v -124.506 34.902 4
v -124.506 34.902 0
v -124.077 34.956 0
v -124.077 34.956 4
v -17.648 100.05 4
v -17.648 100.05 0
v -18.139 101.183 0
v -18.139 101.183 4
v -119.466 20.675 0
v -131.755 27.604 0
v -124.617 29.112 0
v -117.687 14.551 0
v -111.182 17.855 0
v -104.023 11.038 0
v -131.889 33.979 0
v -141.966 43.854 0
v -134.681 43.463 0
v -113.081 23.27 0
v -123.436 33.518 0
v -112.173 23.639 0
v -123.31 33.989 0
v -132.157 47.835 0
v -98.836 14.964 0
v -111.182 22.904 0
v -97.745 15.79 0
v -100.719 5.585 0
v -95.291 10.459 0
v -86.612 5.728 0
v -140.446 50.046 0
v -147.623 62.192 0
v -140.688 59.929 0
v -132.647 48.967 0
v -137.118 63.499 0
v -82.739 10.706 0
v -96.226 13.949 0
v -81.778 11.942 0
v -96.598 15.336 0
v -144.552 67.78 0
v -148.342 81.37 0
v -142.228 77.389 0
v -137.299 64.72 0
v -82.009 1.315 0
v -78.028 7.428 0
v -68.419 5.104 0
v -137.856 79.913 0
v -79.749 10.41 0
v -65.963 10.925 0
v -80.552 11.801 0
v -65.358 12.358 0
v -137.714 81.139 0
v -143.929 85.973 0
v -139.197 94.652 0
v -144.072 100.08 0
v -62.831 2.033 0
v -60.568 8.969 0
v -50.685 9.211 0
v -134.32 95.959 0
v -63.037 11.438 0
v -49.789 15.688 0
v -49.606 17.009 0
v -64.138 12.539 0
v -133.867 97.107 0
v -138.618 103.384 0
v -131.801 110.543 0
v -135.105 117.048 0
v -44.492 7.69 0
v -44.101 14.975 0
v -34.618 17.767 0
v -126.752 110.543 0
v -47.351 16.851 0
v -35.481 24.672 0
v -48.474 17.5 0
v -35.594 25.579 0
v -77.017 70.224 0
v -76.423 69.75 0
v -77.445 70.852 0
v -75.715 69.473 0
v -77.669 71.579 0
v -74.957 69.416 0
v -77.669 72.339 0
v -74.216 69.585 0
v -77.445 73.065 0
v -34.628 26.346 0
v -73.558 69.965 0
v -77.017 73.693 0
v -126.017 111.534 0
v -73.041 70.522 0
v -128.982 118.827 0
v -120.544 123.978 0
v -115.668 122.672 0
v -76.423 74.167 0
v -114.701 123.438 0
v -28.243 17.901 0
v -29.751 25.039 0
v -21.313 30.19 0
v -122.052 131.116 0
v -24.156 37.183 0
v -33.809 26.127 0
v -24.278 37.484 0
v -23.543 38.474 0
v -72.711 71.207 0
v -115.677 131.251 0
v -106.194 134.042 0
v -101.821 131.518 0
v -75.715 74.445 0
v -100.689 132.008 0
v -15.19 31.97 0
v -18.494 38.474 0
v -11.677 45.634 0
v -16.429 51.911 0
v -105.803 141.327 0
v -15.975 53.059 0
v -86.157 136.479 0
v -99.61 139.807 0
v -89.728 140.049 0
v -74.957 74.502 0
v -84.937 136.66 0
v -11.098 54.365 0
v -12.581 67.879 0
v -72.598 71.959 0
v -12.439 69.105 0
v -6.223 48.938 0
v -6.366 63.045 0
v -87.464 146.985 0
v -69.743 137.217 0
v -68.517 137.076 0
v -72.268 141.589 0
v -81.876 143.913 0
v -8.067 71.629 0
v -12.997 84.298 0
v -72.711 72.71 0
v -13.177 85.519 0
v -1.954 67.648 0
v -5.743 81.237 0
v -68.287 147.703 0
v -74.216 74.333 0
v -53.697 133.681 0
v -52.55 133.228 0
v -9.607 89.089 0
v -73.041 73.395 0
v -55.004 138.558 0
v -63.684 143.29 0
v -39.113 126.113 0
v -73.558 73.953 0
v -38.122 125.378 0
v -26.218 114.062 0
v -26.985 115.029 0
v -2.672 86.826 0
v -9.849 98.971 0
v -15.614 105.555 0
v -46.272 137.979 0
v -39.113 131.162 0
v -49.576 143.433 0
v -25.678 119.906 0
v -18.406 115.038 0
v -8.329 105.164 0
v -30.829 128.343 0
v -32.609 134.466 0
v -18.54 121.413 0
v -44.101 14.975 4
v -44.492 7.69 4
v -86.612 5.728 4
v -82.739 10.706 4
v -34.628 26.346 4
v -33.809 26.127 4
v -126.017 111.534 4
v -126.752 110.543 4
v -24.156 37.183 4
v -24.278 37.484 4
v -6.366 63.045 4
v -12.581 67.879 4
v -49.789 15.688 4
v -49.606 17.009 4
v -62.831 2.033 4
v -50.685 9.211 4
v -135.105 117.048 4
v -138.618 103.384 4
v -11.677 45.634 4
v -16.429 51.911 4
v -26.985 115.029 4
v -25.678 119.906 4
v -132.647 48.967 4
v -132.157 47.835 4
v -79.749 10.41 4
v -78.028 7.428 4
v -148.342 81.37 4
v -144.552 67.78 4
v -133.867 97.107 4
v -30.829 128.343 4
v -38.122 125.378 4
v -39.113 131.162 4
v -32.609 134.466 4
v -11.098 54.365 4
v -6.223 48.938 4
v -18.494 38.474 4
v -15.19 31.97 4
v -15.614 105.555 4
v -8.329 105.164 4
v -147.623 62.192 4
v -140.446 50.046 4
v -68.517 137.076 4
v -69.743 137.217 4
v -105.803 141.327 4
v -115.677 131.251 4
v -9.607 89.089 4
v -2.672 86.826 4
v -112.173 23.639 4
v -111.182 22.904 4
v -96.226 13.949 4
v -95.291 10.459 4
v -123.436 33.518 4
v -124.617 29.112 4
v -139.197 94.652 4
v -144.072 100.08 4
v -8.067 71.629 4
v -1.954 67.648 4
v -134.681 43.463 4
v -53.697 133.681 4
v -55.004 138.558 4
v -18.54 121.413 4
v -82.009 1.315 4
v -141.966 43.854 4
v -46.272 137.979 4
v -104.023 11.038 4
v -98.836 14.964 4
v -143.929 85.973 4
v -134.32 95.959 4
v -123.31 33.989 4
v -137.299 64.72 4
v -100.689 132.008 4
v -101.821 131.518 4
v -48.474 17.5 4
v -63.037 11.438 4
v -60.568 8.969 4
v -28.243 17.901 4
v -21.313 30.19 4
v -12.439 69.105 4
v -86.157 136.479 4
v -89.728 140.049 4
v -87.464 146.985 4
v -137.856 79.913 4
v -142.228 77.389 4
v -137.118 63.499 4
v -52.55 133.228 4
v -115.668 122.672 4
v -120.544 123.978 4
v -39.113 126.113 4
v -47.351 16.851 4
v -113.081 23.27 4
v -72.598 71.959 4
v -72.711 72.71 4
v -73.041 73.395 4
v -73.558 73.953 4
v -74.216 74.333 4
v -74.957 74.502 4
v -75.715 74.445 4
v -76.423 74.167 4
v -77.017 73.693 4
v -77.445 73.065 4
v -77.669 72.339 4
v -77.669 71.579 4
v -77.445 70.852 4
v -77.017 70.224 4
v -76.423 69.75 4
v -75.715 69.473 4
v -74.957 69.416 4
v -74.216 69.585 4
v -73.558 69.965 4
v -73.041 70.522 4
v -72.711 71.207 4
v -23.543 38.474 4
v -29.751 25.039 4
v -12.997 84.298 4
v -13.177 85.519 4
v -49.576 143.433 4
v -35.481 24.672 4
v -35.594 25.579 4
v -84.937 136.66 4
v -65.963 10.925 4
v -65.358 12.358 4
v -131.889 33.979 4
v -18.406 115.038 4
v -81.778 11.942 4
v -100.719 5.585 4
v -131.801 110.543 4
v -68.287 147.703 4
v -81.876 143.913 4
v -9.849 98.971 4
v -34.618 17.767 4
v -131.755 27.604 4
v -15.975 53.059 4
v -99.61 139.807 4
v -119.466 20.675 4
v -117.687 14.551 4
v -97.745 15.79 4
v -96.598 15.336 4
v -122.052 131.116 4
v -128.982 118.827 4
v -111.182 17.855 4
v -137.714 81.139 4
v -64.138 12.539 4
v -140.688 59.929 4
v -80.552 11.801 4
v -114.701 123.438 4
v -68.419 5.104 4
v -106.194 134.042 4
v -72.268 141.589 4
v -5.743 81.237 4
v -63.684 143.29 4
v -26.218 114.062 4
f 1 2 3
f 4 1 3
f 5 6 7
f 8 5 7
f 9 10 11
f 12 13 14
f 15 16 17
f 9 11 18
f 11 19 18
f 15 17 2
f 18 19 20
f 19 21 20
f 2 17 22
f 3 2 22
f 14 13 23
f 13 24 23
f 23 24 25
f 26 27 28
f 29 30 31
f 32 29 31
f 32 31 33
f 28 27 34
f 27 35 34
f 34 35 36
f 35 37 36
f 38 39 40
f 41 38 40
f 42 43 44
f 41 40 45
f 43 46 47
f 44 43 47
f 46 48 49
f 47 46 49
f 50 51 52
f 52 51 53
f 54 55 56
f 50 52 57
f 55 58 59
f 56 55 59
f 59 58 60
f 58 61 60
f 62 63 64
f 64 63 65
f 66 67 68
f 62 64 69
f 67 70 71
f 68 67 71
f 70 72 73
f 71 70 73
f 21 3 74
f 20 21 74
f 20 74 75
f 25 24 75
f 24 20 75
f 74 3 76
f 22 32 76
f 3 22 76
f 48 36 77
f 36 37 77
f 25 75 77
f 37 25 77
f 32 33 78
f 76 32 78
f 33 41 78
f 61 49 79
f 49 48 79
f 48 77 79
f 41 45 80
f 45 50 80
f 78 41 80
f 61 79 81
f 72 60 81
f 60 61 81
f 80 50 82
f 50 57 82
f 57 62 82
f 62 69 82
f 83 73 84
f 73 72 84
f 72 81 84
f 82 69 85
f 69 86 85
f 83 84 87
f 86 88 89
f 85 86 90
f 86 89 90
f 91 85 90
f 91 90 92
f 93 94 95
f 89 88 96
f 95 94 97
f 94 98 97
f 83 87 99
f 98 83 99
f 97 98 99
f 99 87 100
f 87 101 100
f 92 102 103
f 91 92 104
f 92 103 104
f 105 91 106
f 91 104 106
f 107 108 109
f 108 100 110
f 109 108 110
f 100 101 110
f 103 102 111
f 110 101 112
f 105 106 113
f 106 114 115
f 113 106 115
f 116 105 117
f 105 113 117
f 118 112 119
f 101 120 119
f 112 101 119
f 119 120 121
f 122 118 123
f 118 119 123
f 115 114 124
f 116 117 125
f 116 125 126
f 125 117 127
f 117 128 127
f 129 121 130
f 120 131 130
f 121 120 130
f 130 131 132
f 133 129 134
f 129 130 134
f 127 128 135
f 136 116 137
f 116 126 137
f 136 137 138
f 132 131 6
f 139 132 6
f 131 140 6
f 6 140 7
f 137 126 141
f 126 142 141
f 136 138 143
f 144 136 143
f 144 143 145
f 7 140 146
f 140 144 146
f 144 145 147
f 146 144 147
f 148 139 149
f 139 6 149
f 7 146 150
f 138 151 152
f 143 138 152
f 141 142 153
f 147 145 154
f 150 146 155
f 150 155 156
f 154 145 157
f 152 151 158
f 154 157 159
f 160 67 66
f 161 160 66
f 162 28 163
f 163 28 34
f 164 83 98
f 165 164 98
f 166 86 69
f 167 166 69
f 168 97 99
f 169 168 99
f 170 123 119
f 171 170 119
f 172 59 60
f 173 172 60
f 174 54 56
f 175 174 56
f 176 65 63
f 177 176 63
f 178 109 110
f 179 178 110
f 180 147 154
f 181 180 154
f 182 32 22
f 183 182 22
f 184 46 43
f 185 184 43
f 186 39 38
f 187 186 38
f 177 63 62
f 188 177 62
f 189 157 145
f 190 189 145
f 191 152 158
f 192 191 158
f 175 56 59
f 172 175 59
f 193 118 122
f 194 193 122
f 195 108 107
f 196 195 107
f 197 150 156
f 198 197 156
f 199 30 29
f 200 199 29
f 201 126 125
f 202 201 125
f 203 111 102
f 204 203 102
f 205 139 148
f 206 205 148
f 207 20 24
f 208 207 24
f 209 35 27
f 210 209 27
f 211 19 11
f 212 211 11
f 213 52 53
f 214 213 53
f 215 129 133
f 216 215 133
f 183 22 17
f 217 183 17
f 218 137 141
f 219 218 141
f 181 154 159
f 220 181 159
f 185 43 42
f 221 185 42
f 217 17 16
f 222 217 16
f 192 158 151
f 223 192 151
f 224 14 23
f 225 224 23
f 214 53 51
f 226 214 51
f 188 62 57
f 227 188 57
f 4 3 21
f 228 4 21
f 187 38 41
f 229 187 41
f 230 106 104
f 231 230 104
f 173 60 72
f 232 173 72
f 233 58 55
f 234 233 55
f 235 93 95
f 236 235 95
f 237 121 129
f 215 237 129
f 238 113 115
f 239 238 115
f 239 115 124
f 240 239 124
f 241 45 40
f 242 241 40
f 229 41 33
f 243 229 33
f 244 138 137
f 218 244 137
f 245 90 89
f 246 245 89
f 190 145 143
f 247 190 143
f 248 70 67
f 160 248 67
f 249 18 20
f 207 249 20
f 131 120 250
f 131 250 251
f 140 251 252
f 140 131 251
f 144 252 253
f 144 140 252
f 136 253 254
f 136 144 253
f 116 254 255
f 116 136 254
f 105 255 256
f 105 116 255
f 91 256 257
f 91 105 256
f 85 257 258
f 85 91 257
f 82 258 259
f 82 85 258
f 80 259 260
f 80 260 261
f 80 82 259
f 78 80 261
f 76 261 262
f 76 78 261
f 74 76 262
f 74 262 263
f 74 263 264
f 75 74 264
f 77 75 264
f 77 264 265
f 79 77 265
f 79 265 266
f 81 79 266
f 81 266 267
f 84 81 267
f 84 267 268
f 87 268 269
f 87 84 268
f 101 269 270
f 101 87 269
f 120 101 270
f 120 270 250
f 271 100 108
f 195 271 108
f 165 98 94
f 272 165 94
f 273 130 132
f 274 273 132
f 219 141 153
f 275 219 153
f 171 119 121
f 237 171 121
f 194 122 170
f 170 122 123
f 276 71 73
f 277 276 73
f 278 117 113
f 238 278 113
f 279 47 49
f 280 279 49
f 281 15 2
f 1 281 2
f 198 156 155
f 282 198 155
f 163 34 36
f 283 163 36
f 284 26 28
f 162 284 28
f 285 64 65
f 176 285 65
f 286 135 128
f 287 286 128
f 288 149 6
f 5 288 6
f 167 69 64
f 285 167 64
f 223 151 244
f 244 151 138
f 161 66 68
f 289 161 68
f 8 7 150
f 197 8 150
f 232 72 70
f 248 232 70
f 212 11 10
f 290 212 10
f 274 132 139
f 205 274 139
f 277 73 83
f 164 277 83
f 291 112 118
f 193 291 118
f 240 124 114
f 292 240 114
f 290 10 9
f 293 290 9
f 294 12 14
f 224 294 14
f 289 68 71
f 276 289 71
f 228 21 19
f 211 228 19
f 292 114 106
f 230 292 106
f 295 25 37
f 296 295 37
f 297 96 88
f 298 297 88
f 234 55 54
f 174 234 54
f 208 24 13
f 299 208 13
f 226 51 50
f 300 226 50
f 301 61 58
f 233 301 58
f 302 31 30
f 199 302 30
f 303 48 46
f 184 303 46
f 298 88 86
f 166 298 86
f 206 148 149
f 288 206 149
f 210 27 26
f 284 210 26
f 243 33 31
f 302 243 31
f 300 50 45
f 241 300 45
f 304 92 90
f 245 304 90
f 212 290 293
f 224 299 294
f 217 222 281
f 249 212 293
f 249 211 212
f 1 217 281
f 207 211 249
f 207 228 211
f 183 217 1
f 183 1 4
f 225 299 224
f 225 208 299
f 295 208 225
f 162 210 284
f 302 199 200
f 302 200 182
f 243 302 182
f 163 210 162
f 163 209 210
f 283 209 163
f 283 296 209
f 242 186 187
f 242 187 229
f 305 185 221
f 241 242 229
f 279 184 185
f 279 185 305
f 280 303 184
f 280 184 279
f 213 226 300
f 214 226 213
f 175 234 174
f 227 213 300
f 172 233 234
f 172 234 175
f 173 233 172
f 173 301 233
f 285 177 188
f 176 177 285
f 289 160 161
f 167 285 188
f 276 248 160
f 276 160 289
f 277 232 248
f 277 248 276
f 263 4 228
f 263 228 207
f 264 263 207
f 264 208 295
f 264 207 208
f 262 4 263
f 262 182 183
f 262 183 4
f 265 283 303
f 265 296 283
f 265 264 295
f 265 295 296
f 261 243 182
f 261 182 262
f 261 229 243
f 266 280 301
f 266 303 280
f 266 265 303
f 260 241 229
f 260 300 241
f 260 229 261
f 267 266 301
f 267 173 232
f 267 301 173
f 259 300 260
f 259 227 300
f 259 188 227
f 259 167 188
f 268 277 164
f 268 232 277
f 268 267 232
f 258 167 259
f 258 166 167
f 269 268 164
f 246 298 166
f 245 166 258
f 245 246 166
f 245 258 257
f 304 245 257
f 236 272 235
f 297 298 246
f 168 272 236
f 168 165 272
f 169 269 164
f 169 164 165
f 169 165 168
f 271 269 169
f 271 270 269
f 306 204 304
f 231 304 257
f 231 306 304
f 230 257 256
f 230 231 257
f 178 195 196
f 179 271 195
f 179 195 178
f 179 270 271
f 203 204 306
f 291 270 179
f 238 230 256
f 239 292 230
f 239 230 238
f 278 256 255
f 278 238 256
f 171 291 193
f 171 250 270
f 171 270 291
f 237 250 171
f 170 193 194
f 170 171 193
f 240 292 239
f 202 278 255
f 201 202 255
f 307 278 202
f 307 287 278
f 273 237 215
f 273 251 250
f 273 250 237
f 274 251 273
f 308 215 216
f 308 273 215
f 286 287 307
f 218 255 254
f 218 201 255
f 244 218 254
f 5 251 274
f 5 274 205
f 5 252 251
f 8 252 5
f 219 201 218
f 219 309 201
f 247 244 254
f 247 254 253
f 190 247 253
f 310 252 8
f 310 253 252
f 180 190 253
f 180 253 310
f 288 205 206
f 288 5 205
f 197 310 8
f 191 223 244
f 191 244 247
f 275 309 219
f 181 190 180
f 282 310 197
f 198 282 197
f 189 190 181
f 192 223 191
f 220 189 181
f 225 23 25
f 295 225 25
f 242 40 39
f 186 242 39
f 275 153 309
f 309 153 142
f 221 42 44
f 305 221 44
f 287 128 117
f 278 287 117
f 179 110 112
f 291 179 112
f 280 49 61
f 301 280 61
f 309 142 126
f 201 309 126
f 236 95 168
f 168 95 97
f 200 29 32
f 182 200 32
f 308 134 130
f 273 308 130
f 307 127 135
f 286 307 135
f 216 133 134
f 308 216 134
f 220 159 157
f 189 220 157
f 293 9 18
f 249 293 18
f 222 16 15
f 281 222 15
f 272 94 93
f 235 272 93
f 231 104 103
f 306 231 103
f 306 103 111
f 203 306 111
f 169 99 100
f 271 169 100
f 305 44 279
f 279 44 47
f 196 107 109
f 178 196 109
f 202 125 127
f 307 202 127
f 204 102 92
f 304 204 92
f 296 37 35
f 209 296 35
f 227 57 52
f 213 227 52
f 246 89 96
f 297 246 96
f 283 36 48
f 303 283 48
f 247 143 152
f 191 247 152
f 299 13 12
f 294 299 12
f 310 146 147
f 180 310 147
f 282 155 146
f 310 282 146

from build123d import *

# Parameters (mm, degrees)
F0_R     = 2.55
F1_DEPTH = 4


with BuildPart() as f1:
    # F0 (on Top) → F1 (new body)
    with BuildSketch(Plane.XY):
        with BuildLine():
            ThreePointArc((-124.5062904637, 34.9019781678), (-94.6798918454, 130.5077918763), (-13.4265490771, 71.9588383555))
            ThreePointArc((-13.4265490771, 71.9588383555), (-15.9460629819, 54.5041481071), (-23.2989066791, 38.4744927287))
            Line((-23.2989066791, 38.4744927287), (-18.4941291809, 38.4744927287))
            Line((-18.4941291809, 38.4744927287), (-15.1902316609, 31.9699118096))
            Line((-15.1902316609, 31.9699118096), (-11.6771652001, 45.6336782124))
            Line((-11.6771652001, 45.6336782124), (-16.4286631589, 51.9111353048))
            Line((-16.4286631589, 51.9111353048), (-15.9749666852, 53.0586016821))
            Line((-15.9749666852, 53.0586016821), (-11.0981749339, 54.3653340935))
            Line((-11.0981749339, 54.3653340935), (-6.2233455697, 48.9375029958))
            Line((-6.2233455697, 48.9375029958), (-6.3664269186, 63.0449363554))
            Line((-6.3664269186, 63.0449363554), (-12.5807469609, 67.8787161199))
            Line((-12.5807469609, 67.8787161199), (-12.4394959717, 69.1045088166))
            Line((-12.4394959717, 69.1045088166), (-8.0670841047, 71.628921985))
            Line((-8.0670841047, 71.628921985), (-1.9535344613, 67.6477384281))
            Line((-1.9535344613, 67.6477384281), (-5.7430128625, 81.2374404747))
            Line((-5.7430128625, 81.2374404747), (-12.996659347, 84.2981288085))
            Line((-12.996659347, 84.2981288085), (-13.1774798638, 85.5187120781))
            Line((-13.1774798638, 85.5187120781), (-9.607420524, 89.0887714179))
            Line((-9.607420524, 89.0887714179), (-2.6717789066, 86.8255464819))
            Line((-2.6717789066, 86.8255464819), (-9.8494076693, 98.9714014791))
            Line((-9.8494076693, 98.9714014791), (-17.6480565754, 100.0504175303))
            Line((-17.6480565754, 100.0504175303), (-18.1386259788, 101.1826106401))
            Line((-18.1386259788, 101.1826106401), (-15.6142128104, 105.5550225071))
            Line((-15.6142128104, 105.5550225071), (-8.3291317335, 105.1639912313))
            Line((-8.3291317335, 105.1639912313), (-18.4057673193, 115.038279233))
            Line((-18.4057673193, 115.038279233), (-26.2179536118, 114.0620898408))
            Line((-26.2179536118, 114.0620898408), (-26.9848404077, 115.0287357013))
            Line((-26.9848404077, 115.0287357013), (-25.6781079963, 119.9055274526))
            Line((-25.6781079963, 119.9055274526), (-18.5400536961, 121.4133379722))
            Line((-18.5400536961, 121.4133379722), (-30.8289900422, 128.3431425691))
            Line((-30.8289900422, 128.3431425691), (-38.1223261356, 125.3782734275))
            Line((-38.1223261356, 125.3782734275), (-39.1132682562, 126.1134967208))
            Line((-39.1132682562, 126.1134967208), (-39.1132682562, 131.1623230577))
            Line((-39.1132682562, 131.1623230577), (-32.6086873371, 134.4662205776))
            Line((-32.6086873371, 134.4662205776), (-46.2724537399, 137.9792870384))
            Line((-46.2724537399, 137.9792870384), (-52.5499108323, 133.2277890797))
            Line((-52.5499108323, 133.2277890797), (-53.6973772096, 133.6814855534))
            Line((-53.6973772096, 133.6814855534), (-55.004109621, 138.5582773046))
            Line((-55.004109621, 138.5582773046), (-49.5762785233, 143.4331066688))
            Line((-49.5762785233, 143.4331066688), (-63.6837118829, 143.2900253199))
            Line((-63.6837118829, 143.2900253199), (-68.5174916473, 137.0757052777))
            Line((-68.5174916473, 137.0757052777), (-69.7432843441, 137.2169562669))
            Line((-69.7432843441, 137.2169562669), (-72.2676975125, 141.5893681339))
            Line((-72.2676975125, 141.5893681339), (-68.2865139556, 147.7029177772))
            Line((-68.2865139556, 147.7029177772), (-81.8762160022, 143.9134393761))
            Line((-81.8762160022, 143.9134393761), (-84.936904336, 136.6597928916))
            Line((-84.936904336, 136.6597928916), (-86.1574876056, 136.4789723748))
            Line((-86.1574876056, 136.4789723748), (-89.7275469454, 140.0490317146))
            Line((-89.7275469454, 140.0490317146), (-87.4643220094, 146.984673332))
            Line((-87.4643220094, 146.984673332), (-99.6101770066, 139.8070445692))
            Line((-99.6101770066, 139.8070445692), (-100.6891930578, 132.0083956632))
            Line((-100.6891930578, 132.0083956632), (-101.8213861675, 131.5178262597))
            Line((-101.8213861675, 131.5178262597), (-106.1937980345, 134.0422394282))
            Line((-106.1937980345, 134.0422394282), (-105.8027667588, 141.3273205051))
            Line((-105.8027667588, 141.3273205051), (-115.6770547604, 131.2506849193))
            Line((-115.6770547604, 131.2506849193), (-114.7008653683, 123.4384986267))
            Line((-114.7008653683, 123.4384986267), (-115.6675112288, 122.6716118309))
            Line((-115.6675112288, 122.6716118309), (-120.54430298, 123.9783442423))
            Line((-120.54430298, 123.9783442423), (-122.0521134997, 131.1163985424))
            Line((-122.0521134997, 131.1163985424), (-128.9819180965, 118.8274621964))
            Line((-128.9819180965, 118.8274621964), (-126.017048955, 111.5341261029))
            Line((-126.017048955, 111.5341261029), (-126.7522722483, 110.5431839824))
            Line((-126.7522722483, 110.5431839824), (-131.8010985851, 110.5431839824))
            Line((-131.8010985851, 110.5431839824), (-135.1049961051, 117.0477649015))
            Line((-135.1049961051, 117.0477649015), (-138.6180625659, 103.3839984987))
            Line((-138.6180625659, 103.3839984987), (-133.8665646072, 97.1065414063))
            Line((-133.8665646072, 97.1065414063), (-134.3202610809, 95.959075029))
            Line((-134.3202610809, 95.959075029), (-139.1970528321, 94.6523426176))
            Line((-139.1970528321, 94.6523426176), (-144.0718821963, 100.0801737153))
            Line((-144.0718821963, 100.0801737153), (-143.9288008474, 85.9727403557))
            Line((-143.9288008474, 85.9727403557), (-137.7144808052, 81.1389605912))
            Line((-137.7144808052, 81.1389605912), (-137.8557317944, 79.9131678945))
            Line((-137.8557317944, 79.9131678945), (-142.2281436614, 77.3887547261))
            Line((-142.2281436614, 77.3887547261), (-148.3416933047, 81.369938283))
            Line((-148.3416933047, 81.369938283), (-144.5522149036, 67.7802362364))
            Line((-144.5522149036, 67.7802362364), (-137.2985684191, 64.7195479026))
            Line((-137.2985684191, 64.7195479026), (-137.1177479023, 63.498964633))
            Line((-137.1177479023, 63.498964633), (-140.6878072421, 59.9289052932))
            Line((-140.6878072421, 59.9289052932), (-147.6234488595, 62.1921302291))
            Line((-147.6234488595, 62.1921302291), (-140.4458200967, 50.046275232))
            Line((-140.4458200967, 50.046275232), (-132.6471711907, 48.9672591808))
            Line((-132.6471711907, 48.9672591808), (-132.1566017872, 47.835066071))
            Line((-132.1566017872, 47.835066071), (-134.6810149557, 43.462654204))
            Line((-134.6810149557, 43.462654204), (-141.9660960326, 43.8536854798))
            Line((-141.9660960326, 43.8536854798), (-131.8894604467, 33.9793974781))
            Line((-131.8894604467, 33.9793974781), (-124.5062904637, 34.9019781678))
        make_face()
        with BuildLine():
            ThreePointArc((-23.2989066791, 38.4744927287), (-15.9460629819, 54.5041481071), (-13.4265490771, 71.9588383555))
            ThreePointArc((-13.4265490771, 71.9588383555), (-94.6798918454, 130.5077918763), (-124.5062904637, 34.9019781678))
            Line((-124.5062904637, 34.9019781678), (-124.0772741542, 34.9555868702))
            Line((-124.0772741542, 34.9555868702), (-123.3103873583, 33.9889410098))
            Line((-123.3103873583, 33.9889410098), (-123.4364920799, 33.5183117819))
            ThreePointArc((-123.4364920799, 33.5183117819), (-118.5620502553, 28.0877025684), (-113.0807312325, 23.2703546153))
            Line((-113.0807312325, 23.2703546153), (-112.1729016304, 23.6394032836))
            Line((-112.1729016304, 23.6394032836), (-111.1819595098, 22.9041799903))
            Line((-111.1819595098, 22.9041799903), (-111.1819595098, 21.8488016761))
            ThreePointArc((-111.1819595098, 21.8488016761), (-105.2066304472, 18.052017229), (-98.8358253845, 14.9644660313))
            Line((-98.8358253845, 14.9644660313), (-97.7453169338, 15.7898876314))
            Line((-97.7453169338, 15.7898876314), (-96.5978505565, 15.3361911577))
            Line((-96.5978505565, 15.3361911577), (-96.2260421237, 13.948583196))
            ThreePointArc((-96.2260421237, 13.948583196), (-89.5738097681, 11.9473835068), (-82.7388325045, 10.7063833793))
            Line((-82.7388325045, 10.7063833793), (-81.7777361187, 11.9419714334))
            Line((-81.7777361187, 11.9419714334), (-80.551943422, 11.8007204442))
            Line((-80.551943422, 11.8007204442), (-79.7487288179, 10.4095119406))
            ThreePointArc((-79.7487288179, 10.4095119406), (-72.8413867162, 10.280875054), (-65.9629386228, 10.9249823317))
            Line((-65.9629386228, 10.9249823317), (-65.3583234301, 12.3578838195))
            Line((-65.3583234301, 12.3578838195), (-64.1377401605, 12.5387043363))
            Line((-64.1377401605, 12.5387043363), (-63.0366787862, 11.4376429621))
            ThreePointArc((-63.0366787862, 11.4376429621), (-56.292631901, 13.1882717832), (-49.7888666259, 15.6878531294))
            Line((-49.7888666259, 15.6878531294), (-49.6060347082, 17.0092810479))
            Line((-49.6060347082, 17.0092810479), (-48.4738415985, 17.4998504513))
            Line((-48.4738415985, 17.4998504513), (-47.3507659556, 16.8514424266))
            ThreePointArc((-47.3507659556, 16.8514424266), (-41.1899957069, 20.4188537942), (-35.480998155, 24.6719539429))
            Line((-35.480998155, 24.6719539429), (-35.5943623977, 25.5791780843))
            Line((-35.5943623977, 25.5791780843), (-34.6277165372, 26.3460648802))
            Line((-34.6277165372, 26.3460648802), (-33.8087849573, 26.1266328247))
            ThreePointArc((-33.8087849573, 26.1266328247), (-28.6525942831, 31.366930379), (-24.156050279, 37.1831243875))
            Line((-24.156050279, 37.1831243875), (-24.2781788111, 37.4835506082))
            Line((-24.2781788111, 37.4835506082), (-23.5429555178, 38.4744927287))
            Line((-23.5429555178, 38.4744927287), (-23.2989066791, 38.4744927287))
        make_face()
        with Locations((-75.147613883, 71.9588383555)):
            Circle(F0_R, mode=Mode.SUBTRACT)
        with BuildLine():
            ThreePointArc((-113.0807312325, 23.2703546153), (-118.5620502553, 28.0877025684), (-123.4364920799, 33.5183117819))
            Line((-123.4364920799, 33.5183117819), (-124.6171197697, 29.1121492585))
            Line((-124.6171197697, 29.1121492585), (-131.7551740699, 27.6043387389))
            Line((-131.7551740699, 27.6043387389), (-119.4662377238, 20.674534142))
            Line((-119.4662377238, 20.674534142), (-113.0807312325, 23.2703546153))
        make_face()
        with BuildLine():
            ThreePointArc((-98.8358253845, 14.9644660313), (-105.2066304472, 18.052017229), (-111.1819595098, 21.8488016761))
            Line((-111.1819595098, 21.8488016761), (-111.1819595098, 17.8553536534))
            Line((-111.1819595098, 17.8553536534), (-117.686540429, 14.5514561335))
            Line((-117.686540429, 14.5514561335), (-104.0227740261, 11.0383896727))
            Line((-104.0227740261, 11.0383896727), (-98.8358253845, 14.9644660313))
        make_face()
        with BuildLine():
            ThreePointArc((-82.7388325045, 10.7063833793), (-89.5738097681, 11.9473835068), (-96.2260421237, 13.948583196))
            Line((-96.2260421237, 13.948583196), (-95.2911181451, 10.4593994065))
            Line((-95.2911181451, 10.4593994065), (-100.7189492428, 5.5845700422))
            Line((-100.7189492428, 5.5845700422), (-86.6115158832, 5.7276513912))
            Line((-86.6115158832, 5.7276513912), (-82.7388325045, 10.7063833793))
        make_face()
        with BuildLine():
            ThreePointArc((-65.9629386228, 10.9249823317), (-72.8413867162, 10.280875054), (-79.7487288179, 10.4095119406))
            Line((-79.7487288179, 10.4095119406), (-78.0275302535, 7.4283085772))
            Line((-78.0275302535, 7.4283085772), (-82.0087138105, 1.3147589338))
            Line((-82.0087138105, 1.3147589338), (-68.4190117639, 5.104237335))
            Line((-68.4190117639, 5.104237335), (-65.9629386228, 10.9249823317))
        make_face()
        with BuildLine():
            Line((-50.6850507595, 9.2106321419), (-49.7888666259, 15.6878531294))
            ThreePointArc((-49.7888666259, 15.6878531294), (-56.292631901, 13.1882717832), (-63.0366787862, 11.4376429621))
            Line((-63.0366787862, 11.4376429621), (-60.5676808207, 8.9686449965))
            Line((-60.5676808207, 8.9686449965), (-62.8309057566, 2.0330033791))
            Line((-62.8309057566, 2.0330033791), (-50.6850507595, 9.2106321419))
        make_face()
        with BuildLine():
            Line((-34.6181730056, 17.7669917918), (-35.480998155, 24.6719539429))
            ThreePointArc((-35.480998155, 24.6719539429), (-41.1899957069, 20.4188537942), (-47.3507659556, 16.8514424266))
            Line((-47.3507659556, 16.8514424266), (-44.1014297315, 14.9754372829))
            Line((-44.1014297315, 14.9754372829), (-44.4924610072, 7.690356206))
            Line((-44.4924610072, 7.690356206), (-34.6181730056, 17.7669917918))
        make_face()
        with BuildLine():
            Line((-21.3133096695, 30.1902145147), (-24.156050279, 37.1831243875))
            ThreePointArc((-24.156050279, 37.1831243875), (-28.6525942831, 31.366930379), (-33.8087849573, 26.1266328247))
            Line((-33.8087849573, 26.1266328247), (-29.750924786, 25.0393324688))
            Line((-29.750924786, 25.0393324688), (-28.2431142663, 17.9012781686))
            Line((-28.2431142663, 17.9012781686), (-21.3133096695, 30.1902145147))
        make_face()
    extrude(amount=F1_DEPTH)


solid = f1.part
